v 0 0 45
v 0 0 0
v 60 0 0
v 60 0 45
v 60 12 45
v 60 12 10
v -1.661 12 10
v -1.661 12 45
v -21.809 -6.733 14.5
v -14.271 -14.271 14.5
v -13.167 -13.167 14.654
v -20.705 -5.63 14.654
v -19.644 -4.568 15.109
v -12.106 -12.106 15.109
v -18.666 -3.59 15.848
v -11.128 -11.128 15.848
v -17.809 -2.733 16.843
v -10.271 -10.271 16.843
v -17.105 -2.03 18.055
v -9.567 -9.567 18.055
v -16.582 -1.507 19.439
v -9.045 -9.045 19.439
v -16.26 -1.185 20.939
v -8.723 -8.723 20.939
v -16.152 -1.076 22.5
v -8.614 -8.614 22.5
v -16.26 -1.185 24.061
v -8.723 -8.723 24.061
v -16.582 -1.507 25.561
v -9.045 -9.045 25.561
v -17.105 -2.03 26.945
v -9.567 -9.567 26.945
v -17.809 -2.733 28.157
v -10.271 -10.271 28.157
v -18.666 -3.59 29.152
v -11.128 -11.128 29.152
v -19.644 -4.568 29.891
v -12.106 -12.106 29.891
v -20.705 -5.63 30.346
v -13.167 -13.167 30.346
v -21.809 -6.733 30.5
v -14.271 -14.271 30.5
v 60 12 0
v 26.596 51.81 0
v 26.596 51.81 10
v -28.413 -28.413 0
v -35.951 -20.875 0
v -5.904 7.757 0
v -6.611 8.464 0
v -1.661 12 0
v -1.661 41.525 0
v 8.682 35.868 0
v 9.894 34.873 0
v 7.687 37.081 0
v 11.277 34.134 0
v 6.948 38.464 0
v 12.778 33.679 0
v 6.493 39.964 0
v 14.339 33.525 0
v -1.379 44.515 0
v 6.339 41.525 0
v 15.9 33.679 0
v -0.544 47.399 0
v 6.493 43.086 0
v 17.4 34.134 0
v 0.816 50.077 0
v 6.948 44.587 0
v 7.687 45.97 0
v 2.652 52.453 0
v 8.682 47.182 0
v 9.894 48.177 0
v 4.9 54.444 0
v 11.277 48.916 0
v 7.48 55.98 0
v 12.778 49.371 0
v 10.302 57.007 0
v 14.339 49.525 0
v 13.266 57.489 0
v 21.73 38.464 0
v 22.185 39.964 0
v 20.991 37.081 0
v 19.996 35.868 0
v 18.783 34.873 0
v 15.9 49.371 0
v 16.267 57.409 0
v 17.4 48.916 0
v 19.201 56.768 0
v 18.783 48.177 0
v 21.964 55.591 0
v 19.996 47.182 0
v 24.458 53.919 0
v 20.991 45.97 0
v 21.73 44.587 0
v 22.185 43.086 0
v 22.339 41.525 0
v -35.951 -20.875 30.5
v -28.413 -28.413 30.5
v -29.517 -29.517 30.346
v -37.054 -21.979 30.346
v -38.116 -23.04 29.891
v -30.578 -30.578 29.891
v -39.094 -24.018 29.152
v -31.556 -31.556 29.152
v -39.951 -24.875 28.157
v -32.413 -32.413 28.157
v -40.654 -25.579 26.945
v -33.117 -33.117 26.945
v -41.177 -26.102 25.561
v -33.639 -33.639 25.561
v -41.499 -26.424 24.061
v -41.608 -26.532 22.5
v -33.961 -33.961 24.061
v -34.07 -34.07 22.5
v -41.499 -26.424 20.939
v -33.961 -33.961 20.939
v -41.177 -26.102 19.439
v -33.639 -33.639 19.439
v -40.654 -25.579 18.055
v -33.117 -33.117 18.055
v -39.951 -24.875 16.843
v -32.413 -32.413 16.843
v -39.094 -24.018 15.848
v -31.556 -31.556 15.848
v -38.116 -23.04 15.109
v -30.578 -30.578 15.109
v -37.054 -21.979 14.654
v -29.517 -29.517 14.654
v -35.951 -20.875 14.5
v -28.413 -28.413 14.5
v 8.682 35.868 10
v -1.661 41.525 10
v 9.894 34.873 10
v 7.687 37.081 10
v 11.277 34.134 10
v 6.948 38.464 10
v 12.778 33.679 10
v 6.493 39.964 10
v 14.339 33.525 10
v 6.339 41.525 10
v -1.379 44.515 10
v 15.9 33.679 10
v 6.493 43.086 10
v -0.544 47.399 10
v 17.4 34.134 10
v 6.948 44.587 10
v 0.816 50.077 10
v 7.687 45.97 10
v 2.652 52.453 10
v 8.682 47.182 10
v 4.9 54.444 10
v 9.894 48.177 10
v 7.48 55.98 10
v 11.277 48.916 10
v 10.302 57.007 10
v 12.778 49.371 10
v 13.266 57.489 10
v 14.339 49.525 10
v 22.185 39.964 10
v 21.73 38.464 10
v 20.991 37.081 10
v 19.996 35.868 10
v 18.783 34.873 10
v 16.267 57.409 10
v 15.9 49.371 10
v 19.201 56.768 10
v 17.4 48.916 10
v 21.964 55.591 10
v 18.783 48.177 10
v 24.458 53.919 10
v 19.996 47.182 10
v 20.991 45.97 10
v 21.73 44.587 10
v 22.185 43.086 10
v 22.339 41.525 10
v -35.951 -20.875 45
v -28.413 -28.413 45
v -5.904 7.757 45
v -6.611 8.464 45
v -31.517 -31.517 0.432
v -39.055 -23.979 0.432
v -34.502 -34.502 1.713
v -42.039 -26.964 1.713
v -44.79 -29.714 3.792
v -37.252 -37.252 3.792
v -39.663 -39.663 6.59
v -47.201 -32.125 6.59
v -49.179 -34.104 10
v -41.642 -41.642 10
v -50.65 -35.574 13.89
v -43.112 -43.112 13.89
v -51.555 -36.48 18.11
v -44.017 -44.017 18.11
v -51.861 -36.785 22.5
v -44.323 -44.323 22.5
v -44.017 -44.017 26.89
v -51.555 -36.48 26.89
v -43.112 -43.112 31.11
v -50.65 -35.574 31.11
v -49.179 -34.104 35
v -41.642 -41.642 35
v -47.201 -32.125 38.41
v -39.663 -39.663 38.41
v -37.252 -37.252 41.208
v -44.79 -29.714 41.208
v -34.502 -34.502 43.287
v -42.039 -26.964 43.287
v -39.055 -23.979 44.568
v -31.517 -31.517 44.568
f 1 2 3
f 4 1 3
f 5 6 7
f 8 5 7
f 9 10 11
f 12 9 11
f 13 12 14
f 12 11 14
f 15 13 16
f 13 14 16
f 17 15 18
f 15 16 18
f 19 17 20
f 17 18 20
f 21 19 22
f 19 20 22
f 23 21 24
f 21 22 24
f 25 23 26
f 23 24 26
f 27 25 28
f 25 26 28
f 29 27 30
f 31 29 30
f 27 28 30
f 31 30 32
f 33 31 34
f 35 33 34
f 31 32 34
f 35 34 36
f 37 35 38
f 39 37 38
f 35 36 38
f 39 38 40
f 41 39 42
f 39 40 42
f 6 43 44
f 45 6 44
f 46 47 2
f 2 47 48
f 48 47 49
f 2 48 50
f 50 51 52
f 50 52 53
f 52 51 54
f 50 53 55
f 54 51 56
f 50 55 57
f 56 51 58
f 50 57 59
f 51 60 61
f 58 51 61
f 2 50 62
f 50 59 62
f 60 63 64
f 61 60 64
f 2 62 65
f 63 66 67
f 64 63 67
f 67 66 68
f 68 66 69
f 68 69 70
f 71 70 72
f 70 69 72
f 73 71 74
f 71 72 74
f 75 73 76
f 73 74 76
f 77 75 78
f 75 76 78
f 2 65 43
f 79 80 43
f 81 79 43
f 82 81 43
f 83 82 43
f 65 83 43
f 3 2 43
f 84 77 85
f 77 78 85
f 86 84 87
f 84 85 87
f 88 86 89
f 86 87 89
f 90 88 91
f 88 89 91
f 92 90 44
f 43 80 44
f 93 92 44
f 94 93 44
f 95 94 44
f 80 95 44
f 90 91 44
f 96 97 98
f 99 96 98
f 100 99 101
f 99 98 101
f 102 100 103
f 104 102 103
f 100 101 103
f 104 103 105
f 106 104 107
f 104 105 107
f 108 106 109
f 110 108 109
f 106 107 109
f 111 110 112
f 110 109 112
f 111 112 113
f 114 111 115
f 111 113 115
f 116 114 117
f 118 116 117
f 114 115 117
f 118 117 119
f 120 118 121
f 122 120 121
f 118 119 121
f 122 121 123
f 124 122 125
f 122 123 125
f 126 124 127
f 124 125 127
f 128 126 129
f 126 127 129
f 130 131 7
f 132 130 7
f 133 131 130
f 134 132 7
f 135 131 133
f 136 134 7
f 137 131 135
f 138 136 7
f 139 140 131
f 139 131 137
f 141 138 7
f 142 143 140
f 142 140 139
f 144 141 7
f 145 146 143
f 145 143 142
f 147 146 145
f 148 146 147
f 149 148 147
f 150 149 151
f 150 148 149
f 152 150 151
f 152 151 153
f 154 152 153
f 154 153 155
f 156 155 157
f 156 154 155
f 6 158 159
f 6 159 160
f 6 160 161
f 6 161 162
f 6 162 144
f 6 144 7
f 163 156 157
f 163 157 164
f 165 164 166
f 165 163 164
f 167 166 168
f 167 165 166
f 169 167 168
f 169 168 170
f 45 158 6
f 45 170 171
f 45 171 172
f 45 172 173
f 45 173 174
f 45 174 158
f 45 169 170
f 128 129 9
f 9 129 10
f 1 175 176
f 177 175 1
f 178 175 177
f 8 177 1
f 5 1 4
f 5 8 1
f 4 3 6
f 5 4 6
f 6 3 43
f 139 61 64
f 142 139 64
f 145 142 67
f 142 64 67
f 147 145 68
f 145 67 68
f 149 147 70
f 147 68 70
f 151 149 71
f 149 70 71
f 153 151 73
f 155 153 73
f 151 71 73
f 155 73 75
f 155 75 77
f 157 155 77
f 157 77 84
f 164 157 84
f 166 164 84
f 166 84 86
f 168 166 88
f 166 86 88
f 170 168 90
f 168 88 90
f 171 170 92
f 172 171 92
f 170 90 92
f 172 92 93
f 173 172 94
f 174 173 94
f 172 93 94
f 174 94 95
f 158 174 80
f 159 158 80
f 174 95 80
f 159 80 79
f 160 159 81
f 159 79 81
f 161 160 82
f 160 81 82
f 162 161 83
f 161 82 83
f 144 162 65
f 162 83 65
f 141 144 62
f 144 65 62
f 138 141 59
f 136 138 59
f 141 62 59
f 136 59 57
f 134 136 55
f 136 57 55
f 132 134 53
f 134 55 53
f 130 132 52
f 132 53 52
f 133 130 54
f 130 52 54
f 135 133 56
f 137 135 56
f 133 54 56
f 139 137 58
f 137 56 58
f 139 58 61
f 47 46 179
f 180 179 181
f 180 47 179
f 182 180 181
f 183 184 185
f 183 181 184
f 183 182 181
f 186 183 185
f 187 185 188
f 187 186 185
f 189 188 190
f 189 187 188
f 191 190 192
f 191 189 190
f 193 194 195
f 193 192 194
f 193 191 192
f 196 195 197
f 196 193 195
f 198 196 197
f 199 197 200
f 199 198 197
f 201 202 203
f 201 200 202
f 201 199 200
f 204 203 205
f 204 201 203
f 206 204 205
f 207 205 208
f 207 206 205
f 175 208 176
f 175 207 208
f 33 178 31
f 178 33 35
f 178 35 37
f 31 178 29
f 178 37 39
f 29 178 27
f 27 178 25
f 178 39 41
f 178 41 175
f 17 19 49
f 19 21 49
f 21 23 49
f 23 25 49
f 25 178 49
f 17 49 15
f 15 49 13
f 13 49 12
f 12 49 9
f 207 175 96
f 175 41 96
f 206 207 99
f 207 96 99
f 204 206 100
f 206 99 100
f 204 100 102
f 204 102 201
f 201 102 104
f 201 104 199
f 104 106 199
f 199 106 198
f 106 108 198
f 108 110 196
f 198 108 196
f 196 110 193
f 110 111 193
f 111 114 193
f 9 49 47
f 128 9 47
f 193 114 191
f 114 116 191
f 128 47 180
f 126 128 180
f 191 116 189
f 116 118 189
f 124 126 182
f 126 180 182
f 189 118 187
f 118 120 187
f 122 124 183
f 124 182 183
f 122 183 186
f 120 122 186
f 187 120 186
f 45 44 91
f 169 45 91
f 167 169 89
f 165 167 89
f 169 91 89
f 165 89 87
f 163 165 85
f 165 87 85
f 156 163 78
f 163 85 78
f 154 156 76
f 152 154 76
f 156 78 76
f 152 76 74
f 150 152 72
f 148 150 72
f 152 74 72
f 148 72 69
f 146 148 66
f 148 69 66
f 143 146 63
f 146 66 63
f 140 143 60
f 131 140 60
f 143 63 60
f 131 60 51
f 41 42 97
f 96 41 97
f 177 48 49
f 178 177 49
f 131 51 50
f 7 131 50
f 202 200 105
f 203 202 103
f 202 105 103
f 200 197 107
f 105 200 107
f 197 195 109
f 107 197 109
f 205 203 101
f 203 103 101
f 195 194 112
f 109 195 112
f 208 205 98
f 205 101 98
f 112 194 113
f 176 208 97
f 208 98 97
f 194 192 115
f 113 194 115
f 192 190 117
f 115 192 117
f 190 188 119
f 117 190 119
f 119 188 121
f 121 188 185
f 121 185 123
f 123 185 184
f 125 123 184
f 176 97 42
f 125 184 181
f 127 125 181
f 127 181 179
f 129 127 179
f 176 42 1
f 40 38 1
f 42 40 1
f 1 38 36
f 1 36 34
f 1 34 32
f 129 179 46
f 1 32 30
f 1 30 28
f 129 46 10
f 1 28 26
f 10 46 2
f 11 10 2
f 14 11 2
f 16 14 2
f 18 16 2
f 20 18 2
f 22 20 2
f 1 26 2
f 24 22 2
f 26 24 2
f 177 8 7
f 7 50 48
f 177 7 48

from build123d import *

# Parameters (mm, degrees)
EXTRUDE_1_DEPTH          = 45
SKETCH_3_R               = 8
EXTRUDE_2_DEPTH          = 10
FILLET_1_RADIUS          = 22.5
FILLET_1_LENGTH          = 10.659867141
CUT_EXTRUDE_1_DEPTH      = 97.311280041
CUT_EXTRUDE_1_DEPTH_BACK = 97.311280041


with BuildPart() as part:
    # 草图2 → 凸台-拉伸1 (new body)
    with BuildSketch(Plane.XY):
        Polygon((0, 0), (60, 0), (60, 12), (-1.661115121, 12), (-5.903755809, 7.757359313), (-6.61086259, 8.464466094), (-51.860645565, -36.785316881), (-44.322981223, -44.322981223), align=None)
    extrude(amount=EXTRUDE_1_DEPTH)

    # 草图3 → 凸台-拉伸2 (add)
    with BuildSketch(Plane(origin=(0, 0, 0), x_dir=(-1, 0, 0), z_dir=(0, 0, -1))):
        with BuildLine():
            Line((-60, 12), (-26.595595968, 51.809818513))
            ThreePointArc((-26.595595968, 51.809818513), (-8.866562585, 56.560298691), (1.661115121, 41.525216758))
            Line((1.661115121, 41.525216758), (1.661115121, 12))
            Line((1.661115121, 12), (-60, 12))
        make_face()
        with Locations((-14.338884879, 41.525216758)):
            Circle(SKETCH_3_R, mode=Mode.SUBTRACT)
    extrude(amount=-EXTRUDE_2_DEPTH)

    # 圆角1: full round fillet: the end face becomes a half cylinder, R = half its width
    fillet_1_face = Plane((-48.091813394, -40.554149052, 22.5), x_dir=(-0.707106781187, 0.707106781187, 0), z_dir=(-0.707106781187, -0.707106781187, 0))  # on the end face: x along it, z out of the body
    fillet_1_slab = fillet_1_face.offset(-FILLET_1_RADIUS / 2) * Box(FILLET_1_LENGTH, 2 * FILLET_1_RADIUS, FILLET_1_RADIUS, mode=Mode.PRIVATE)  # the body's end, R deep
    fillet_1_round = Plane((-32.181910817, -24.644246475, 22.5), x_dir=(-0.707106781187, -0.707106781187, 0), z_dir=(-0.707106781187, 0.707106781187, 0)) * Cylinder(FILLET_1_RADIUS, FILLET_1_LENGTH, mode=Mode.PRIVATE)  # its axis R under the face
    add(fillet_1_slab - fillet_1_round, mode=Mode.SUBTRACT)

    # 草图6 → 切除-拉伸1 (cut, two sides: drawn at the far end of the back side and taken through both)
    with BuildSketch(Plane(origin=(-7.537664342, 7.537664342, 0), x_dir=(0, 0, 1), z_dir=(-0.7071067811865487, 0.7071067811865465, 0)).offset(-CUT_EXTRUDE_1_DEPTH_BACK)):
        with BuildLine():
            Line((30.5, -20.182161171), (30.5, -40.182161171))
            ThreePointArc((30.5, -40.182161171), (22.5, -48.182161171), (14.5, -40.182161171))
            Line((14.5, -40.182161171), (14.5, -20.182161171))
            ThreePointArc((14.5, -20.182161171), (22.5, -12.182161171), (30.5, -20.182161171))
        make_face()
    extrude(amount=CUT_EXTRUDE_1_DEPTH + CUT_EXTRUDE_1_DEPTH_BACK, mode=Mode.SUBTRACT)


solid = part.part
